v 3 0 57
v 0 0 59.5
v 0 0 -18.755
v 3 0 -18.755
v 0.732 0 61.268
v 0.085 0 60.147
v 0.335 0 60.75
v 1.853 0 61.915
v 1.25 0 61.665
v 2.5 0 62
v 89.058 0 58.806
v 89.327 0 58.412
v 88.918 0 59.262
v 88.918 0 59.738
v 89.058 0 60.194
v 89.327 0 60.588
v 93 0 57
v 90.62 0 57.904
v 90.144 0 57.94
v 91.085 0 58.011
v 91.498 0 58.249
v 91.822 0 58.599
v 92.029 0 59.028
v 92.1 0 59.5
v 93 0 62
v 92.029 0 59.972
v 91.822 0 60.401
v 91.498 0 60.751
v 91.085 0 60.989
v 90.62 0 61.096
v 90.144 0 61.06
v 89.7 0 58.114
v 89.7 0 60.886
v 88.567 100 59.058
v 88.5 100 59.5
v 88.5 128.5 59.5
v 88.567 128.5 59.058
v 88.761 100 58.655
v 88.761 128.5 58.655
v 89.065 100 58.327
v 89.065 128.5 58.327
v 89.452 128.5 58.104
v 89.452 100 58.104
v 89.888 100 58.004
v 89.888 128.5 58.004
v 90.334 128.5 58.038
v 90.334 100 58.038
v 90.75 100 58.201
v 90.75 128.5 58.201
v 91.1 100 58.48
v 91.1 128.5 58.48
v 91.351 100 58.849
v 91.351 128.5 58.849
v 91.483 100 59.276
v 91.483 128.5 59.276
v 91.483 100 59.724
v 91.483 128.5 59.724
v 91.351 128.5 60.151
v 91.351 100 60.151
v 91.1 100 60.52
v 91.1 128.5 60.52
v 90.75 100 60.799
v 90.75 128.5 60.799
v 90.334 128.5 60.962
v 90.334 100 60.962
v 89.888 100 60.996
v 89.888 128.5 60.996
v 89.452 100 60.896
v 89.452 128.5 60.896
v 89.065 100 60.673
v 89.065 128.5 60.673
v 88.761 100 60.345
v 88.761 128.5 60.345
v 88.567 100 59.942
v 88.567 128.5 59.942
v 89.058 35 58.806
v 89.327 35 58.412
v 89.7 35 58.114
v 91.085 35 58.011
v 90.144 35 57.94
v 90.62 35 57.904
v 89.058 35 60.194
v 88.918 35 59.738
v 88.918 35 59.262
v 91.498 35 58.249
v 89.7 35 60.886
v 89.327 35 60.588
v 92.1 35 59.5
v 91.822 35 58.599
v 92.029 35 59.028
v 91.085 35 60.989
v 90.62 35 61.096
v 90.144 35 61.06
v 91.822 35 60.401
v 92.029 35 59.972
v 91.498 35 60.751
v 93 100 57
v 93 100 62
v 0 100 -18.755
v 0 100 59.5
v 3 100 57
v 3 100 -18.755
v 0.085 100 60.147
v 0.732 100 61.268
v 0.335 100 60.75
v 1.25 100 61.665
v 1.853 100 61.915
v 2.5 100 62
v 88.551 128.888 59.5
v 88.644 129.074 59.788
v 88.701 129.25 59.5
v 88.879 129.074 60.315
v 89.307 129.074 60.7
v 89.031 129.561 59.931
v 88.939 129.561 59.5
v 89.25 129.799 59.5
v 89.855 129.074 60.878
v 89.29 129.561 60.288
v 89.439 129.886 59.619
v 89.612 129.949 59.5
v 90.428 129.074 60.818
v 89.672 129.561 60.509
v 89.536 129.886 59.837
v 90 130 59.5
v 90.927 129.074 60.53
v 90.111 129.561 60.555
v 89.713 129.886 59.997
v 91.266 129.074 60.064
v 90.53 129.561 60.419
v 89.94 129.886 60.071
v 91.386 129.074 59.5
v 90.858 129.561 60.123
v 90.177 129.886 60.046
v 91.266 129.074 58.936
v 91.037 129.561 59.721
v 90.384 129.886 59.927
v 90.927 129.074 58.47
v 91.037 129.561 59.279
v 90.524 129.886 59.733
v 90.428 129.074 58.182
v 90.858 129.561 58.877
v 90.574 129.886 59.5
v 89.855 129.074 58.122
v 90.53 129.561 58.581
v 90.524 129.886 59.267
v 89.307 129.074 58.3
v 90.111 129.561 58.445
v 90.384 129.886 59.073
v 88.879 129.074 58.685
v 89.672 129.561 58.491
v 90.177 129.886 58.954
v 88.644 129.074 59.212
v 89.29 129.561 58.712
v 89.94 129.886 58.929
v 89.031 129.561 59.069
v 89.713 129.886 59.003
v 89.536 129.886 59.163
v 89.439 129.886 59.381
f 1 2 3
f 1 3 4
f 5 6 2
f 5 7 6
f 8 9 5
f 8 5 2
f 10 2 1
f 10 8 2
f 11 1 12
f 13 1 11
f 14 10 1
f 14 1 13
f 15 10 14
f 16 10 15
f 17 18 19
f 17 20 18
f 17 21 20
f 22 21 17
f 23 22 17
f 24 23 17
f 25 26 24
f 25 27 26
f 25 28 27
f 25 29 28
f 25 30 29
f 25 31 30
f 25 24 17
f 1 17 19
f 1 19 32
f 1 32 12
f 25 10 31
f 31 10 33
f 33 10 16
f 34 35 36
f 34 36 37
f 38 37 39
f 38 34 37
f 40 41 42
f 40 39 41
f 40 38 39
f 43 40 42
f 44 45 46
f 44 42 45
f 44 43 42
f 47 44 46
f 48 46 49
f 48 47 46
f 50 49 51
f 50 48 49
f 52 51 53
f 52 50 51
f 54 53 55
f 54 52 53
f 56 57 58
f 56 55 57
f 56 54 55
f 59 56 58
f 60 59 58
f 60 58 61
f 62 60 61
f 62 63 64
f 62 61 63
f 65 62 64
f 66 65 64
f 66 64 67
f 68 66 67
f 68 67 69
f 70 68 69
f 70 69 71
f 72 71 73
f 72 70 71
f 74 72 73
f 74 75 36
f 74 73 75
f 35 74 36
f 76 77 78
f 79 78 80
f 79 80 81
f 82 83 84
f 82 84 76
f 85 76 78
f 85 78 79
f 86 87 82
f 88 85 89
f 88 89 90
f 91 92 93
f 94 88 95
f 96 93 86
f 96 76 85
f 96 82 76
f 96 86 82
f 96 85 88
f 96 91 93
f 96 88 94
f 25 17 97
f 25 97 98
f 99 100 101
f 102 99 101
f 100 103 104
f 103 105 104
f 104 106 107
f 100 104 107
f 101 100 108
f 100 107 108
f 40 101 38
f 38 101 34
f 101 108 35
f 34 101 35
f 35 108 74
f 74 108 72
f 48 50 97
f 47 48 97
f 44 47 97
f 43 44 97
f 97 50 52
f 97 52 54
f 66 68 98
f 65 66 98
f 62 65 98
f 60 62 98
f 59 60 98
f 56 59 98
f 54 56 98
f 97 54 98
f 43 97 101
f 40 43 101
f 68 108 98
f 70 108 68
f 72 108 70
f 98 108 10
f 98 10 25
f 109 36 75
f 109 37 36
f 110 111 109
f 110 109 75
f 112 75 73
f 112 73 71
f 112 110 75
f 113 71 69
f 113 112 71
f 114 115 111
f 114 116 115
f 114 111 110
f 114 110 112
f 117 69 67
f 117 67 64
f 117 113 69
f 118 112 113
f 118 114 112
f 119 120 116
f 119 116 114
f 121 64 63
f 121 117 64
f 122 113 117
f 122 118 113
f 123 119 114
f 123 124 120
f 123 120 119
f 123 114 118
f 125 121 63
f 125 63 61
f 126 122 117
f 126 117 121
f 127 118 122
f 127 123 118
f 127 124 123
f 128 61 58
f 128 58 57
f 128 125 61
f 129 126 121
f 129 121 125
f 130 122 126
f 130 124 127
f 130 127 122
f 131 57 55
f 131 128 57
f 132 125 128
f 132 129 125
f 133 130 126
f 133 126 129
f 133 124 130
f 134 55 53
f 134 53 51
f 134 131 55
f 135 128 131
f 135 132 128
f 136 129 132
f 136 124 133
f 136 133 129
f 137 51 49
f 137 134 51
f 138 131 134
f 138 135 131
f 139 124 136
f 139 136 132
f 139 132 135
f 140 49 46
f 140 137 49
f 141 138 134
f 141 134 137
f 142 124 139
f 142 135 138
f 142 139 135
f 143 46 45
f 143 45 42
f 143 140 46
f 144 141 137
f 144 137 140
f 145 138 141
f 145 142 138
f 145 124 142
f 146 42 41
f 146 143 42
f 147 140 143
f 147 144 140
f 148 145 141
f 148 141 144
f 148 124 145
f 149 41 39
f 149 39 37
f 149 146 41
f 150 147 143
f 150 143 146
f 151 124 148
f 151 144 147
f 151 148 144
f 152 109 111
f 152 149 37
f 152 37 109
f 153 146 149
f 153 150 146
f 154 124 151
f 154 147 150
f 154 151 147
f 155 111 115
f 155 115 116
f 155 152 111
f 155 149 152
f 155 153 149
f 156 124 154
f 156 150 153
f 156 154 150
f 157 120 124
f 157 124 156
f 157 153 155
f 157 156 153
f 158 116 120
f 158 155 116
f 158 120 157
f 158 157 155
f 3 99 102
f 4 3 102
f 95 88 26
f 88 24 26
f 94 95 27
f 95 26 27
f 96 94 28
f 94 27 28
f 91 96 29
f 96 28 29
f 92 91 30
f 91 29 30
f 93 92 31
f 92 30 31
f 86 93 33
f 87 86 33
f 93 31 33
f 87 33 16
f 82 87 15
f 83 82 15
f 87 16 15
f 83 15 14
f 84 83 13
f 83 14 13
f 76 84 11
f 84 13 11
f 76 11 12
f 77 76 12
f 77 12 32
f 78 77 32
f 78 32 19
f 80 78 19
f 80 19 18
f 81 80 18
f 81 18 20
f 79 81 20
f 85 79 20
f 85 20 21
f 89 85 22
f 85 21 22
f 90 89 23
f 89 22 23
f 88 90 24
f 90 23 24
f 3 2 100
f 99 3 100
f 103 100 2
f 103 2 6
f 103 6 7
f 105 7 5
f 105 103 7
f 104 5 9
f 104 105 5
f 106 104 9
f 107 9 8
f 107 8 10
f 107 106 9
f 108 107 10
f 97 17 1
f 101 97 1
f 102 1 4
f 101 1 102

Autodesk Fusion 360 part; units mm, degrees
sketch "스케치1" plane through (0, 0, 0) normal (0, 1, 0) x (1, 0, 0)
  line L0 (0, 0) -> (6, 0)
  line L1 (0, 0) -> (0, -62)
  line L2 (0, -62) -> (93, -62)
  line L3 (6, 0) -> (6, -57)
  line L4 (6, -57) -> (93, -57)
  line L5 (93, -57) -> (93, -62)
  line L6 (6, -57) -> (3, -57)
  line L7 (3, -57) -> (3, 0)
  line L8 (3, 0) -> (6, 0)
  line L9 (6, 0) -> (6, -57)
  dimension "d1" = 6
  dimension "d2" = 62
  dimension "d3" = 93
  dimension "d4" = 57
extrude "돌출1" add sketch "스케치1" along normal blind 100 contours L0 L1 L2 L4 L5 L6 L7
sketch "스케치2" plane through (0, 0, 0) normal (0, -1, 0) x (1, 0, 0)
  line L0 (0, 62) -> (0, 0)
  line L1 (0, 0) -> (3, 0)
  line L2 (3, 57) -> (93, 57)
  line L3 (93, 57) -> (93, 62)
  line L4 (93, 62) -> (0, 62)
  line L5 (93, 62) -> (88, 62)
  line L6 (88, 62) -> (88, 57)
  line L7 (88, 57) -> (93, 57)
  line L8 (93, 57) -> (93, 62)
  circle A0 centre (90.5, 59.5) radius 1.6
  line L9 (3, 0) -> (3, 57)
  dimension "d7" = 3.2
extrude "돌출2" cut sketch "스케치2" against normal blind 35 contours A0
sketch "스케치3" plane through (0, 100, 0) normal (0, 1, 0) x (-1, 0, 0)
  line L0 (0, 0) -> (0, 62)
  line L1 (0, 62) -> (-93, 62)
  line L2 (-93, 62) -> (-93, 57)
  line L3 (-93, 57) -> (-3, 57)
  line L4 (-3, 0) -> (0, 0)
  line L5 (-93, 62) -> (-87, 62)
  line L6 (-87, 62) -> (-87, 57)
  line L7 (-87, 57) -> (-93, 57)
  line L8 (-93, 57) -> (-93, 62)
  circle A0 centre (-90, 59.5) radius 1.5
  line L9 (-3, 57) -> (-3, 0)
  dimension "d10" = 3
extrude "돌출3" add sketch "스케치3" along normal blind 30 contours A0
fillet "필렛1" radius 1.5 1 edges at (91.3985, 130, 58.9576)
fillet "필렛2" radius 2.5 1 edges at (0, 50, 62)
extrude "돌출4" add 1 faces at (1, 66.6667, 0) along direction (0, 0, -1) blind 18.755
